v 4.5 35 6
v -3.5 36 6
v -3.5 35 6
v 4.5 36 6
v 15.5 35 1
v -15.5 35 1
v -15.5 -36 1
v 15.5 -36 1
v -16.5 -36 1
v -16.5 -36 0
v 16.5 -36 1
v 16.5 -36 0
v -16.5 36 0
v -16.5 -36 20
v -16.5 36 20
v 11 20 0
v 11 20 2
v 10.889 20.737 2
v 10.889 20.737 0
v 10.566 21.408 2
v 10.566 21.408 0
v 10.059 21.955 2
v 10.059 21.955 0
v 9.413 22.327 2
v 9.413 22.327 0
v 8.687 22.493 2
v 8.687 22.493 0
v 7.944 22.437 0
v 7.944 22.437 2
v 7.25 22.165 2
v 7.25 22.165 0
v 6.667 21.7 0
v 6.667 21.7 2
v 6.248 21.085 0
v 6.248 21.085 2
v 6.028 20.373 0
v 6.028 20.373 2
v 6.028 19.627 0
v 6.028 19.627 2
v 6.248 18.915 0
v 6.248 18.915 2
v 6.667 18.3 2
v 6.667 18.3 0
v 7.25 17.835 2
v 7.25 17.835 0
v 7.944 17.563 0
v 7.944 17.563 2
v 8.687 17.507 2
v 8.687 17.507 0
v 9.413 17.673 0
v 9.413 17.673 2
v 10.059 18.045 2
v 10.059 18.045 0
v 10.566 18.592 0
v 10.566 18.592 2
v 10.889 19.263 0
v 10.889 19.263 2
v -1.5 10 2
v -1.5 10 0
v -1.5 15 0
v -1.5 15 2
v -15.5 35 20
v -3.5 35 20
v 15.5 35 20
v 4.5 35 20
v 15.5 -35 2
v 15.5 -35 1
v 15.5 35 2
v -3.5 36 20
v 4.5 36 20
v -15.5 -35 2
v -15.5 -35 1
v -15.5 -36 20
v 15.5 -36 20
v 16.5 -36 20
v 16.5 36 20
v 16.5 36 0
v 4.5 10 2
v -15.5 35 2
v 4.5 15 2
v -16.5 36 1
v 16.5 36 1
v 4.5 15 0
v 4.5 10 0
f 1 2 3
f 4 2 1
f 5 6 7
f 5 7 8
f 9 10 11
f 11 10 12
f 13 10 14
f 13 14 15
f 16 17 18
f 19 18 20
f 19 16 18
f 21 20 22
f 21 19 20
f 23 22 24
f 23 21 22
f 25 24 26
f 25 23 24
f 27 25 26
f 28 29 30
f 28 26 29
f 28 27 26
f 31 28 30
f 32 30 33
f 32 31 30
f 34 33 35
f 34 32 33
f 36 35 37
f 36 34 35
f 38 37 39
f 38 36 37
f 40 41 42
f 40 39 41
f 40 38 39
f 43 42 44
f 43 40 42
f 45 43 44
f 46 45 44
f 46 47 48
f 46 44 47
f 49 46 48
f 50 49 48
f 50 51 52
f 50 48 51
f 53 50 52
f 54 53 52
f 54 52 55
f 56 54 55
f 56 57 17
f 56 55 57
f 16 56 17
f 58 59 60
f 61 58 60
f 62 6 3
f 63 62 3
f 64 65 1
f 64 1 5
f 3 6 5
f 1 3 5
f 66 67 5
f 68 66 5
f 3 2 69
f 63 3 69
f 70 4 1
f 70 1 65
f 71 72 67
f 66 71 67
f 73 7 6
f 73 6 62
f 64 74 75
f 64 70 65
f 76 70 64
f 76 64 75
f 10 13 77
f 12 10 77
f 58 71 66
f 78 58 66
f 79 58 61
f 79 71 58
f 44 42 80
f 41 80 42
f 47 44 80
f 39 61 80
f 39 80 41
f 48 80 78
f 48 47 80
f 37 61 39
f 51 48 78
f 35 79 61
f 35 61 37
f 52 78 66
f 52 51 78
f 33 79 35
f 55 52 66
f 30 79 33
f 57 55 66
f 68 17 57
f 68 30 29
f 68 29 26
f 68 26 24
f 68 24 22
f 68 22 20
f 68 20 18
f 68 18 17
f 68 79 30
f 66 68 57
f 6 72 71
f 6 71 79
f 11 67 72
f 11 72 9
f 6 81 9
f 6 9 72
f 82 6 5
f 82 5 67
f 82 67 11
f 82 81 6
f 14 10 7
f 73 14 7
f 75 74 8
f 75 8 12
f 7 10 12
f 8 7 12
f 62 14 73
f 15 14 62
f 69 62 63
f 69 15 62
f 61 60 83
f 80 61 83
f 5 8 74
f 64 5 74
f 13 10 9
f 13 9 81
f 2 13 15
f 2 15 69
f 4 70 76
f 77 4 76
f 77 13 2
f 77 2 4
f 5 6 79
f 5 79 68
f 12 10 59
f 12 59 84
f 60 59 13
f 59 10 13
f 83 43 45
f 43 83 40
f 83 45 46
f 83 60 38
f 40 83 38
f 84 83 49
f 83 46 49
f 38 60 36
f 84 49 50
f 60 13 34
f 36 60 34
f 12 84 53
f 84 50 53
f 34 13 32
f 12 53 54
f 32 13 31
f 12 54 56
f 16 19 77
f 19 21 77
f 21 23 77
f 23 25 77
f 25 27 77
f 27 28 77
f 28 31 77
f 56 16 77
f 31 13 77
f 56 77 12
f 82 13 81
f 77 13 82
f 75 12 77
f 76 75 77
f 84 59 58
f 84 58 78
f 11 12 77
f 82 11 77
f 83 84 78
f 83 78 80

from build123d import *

# Parameters (mm, degrees)
SKETCH_W             = 33
SKETCH_H             = 72
PAD_DEPTH            = 20
SKETCH001_W          = 31
SKETCH001_H          = 70
POCKET_DEPTH         = 19
SKETCH002_W          = 8
SKETCH002_H          = 14.003113
POCKET001_DEPTH      = 5
SKETCH003_W          = 31
SKETCH003_H          = 19
POCKET002_DEPTH      = 5
SKETCH004_W          = 33
SKETCH004_H          = 72
PAD001_DEPTH         = 1
SKETCH005_W          = 31
SKETCH005_H          = 70
PAD002_DEPTH         = 2
SKETCH006_W          = 6
SKETCH006_H          = 5
POCKET003_DEPTH      = 0.001
POCKET003_DEPTH_BACK = -2.001
SKETCH007_R          = 2.5
POCKET004_DEPTH      = 2.001


with BuildPart() as body:
    # Sketch → Pad (new body)
    with BuildSketch(Plane.XY):
        Rectangle(SKETCH_W, SKETCH_H)
    extrude(amount=PAD_DEPTH)

    # Sketch001 → Pocket (cut)
    with BuildSketch(Plane.XY.offset(1)):
        Rectangle(SKETCH001_W, SKETCH001_H)
    extrude(amount=POCKET_DEPTH, mode=Mode.SUBTRACT)

    # Sketch002 → Pocket001 (cut)
    with BuildSketch(Plane.XZ.offset(-36)):
        with Locations((0.5, 13.001556)):
            Rectangle(SKETCH002_W, SKETCH002_H)
    extrude(amount=POCKET001_DEPTH, mode=Mode.SUBTRACT)

    # Sketch003 → Pocket002 (cut)
    with BuildSketch(Plane.XZ.offset(35)):
        with Locations((0, 10.5)):
            Rectangle(SKETCH003_W, SKETCH003_H)
    extrude(amount=POCKET002_DEPTH, mode=Mode.SUBTRACT)


with BuildPart() as cover:
    # Sketch004 → Pad001 (new body)
    with BuildSketch(Plane.XY):
        Rectangle(SKETCH004_W, SKETCH004_H)
    extrude(amount=PAD001_DEPTH)

    # Sketch005 → Pad002 (join)
    with BuildSketch(Plane.XY):
        Rectangle(SKETCH005_W, SKETCH005_H)
    extrude(amount=PAD002_DEPTH)

    # Sketch006 → Pocket003 (cut, two sides)
    with BuildSketch(Plane.XY) as pocket003_sk:
        with Locations((1.5, 12.5)):
            Rectangle(SKETCH006_W, SKETCH006_H)
    extrude(amount=-POCKET003_DEPTH, mode=Mode.SUBTRACT)
    extrude(pocket003_sk.sketch, amount=-POCKET003_DEPTH_BACK, mode=Mode.SUBTRACT)

    # Sketch007 → Pocket004 (cut, through all)
    with BuildSketch(Plane.XY):
        with Locations((8.5, 20)):
            Circle(SKETCH007_R)
    extrude(amount=POCKET004_DEPTH, mode=Mode.SUBTRACT)


solid = Compound([body.part, cover.part])
